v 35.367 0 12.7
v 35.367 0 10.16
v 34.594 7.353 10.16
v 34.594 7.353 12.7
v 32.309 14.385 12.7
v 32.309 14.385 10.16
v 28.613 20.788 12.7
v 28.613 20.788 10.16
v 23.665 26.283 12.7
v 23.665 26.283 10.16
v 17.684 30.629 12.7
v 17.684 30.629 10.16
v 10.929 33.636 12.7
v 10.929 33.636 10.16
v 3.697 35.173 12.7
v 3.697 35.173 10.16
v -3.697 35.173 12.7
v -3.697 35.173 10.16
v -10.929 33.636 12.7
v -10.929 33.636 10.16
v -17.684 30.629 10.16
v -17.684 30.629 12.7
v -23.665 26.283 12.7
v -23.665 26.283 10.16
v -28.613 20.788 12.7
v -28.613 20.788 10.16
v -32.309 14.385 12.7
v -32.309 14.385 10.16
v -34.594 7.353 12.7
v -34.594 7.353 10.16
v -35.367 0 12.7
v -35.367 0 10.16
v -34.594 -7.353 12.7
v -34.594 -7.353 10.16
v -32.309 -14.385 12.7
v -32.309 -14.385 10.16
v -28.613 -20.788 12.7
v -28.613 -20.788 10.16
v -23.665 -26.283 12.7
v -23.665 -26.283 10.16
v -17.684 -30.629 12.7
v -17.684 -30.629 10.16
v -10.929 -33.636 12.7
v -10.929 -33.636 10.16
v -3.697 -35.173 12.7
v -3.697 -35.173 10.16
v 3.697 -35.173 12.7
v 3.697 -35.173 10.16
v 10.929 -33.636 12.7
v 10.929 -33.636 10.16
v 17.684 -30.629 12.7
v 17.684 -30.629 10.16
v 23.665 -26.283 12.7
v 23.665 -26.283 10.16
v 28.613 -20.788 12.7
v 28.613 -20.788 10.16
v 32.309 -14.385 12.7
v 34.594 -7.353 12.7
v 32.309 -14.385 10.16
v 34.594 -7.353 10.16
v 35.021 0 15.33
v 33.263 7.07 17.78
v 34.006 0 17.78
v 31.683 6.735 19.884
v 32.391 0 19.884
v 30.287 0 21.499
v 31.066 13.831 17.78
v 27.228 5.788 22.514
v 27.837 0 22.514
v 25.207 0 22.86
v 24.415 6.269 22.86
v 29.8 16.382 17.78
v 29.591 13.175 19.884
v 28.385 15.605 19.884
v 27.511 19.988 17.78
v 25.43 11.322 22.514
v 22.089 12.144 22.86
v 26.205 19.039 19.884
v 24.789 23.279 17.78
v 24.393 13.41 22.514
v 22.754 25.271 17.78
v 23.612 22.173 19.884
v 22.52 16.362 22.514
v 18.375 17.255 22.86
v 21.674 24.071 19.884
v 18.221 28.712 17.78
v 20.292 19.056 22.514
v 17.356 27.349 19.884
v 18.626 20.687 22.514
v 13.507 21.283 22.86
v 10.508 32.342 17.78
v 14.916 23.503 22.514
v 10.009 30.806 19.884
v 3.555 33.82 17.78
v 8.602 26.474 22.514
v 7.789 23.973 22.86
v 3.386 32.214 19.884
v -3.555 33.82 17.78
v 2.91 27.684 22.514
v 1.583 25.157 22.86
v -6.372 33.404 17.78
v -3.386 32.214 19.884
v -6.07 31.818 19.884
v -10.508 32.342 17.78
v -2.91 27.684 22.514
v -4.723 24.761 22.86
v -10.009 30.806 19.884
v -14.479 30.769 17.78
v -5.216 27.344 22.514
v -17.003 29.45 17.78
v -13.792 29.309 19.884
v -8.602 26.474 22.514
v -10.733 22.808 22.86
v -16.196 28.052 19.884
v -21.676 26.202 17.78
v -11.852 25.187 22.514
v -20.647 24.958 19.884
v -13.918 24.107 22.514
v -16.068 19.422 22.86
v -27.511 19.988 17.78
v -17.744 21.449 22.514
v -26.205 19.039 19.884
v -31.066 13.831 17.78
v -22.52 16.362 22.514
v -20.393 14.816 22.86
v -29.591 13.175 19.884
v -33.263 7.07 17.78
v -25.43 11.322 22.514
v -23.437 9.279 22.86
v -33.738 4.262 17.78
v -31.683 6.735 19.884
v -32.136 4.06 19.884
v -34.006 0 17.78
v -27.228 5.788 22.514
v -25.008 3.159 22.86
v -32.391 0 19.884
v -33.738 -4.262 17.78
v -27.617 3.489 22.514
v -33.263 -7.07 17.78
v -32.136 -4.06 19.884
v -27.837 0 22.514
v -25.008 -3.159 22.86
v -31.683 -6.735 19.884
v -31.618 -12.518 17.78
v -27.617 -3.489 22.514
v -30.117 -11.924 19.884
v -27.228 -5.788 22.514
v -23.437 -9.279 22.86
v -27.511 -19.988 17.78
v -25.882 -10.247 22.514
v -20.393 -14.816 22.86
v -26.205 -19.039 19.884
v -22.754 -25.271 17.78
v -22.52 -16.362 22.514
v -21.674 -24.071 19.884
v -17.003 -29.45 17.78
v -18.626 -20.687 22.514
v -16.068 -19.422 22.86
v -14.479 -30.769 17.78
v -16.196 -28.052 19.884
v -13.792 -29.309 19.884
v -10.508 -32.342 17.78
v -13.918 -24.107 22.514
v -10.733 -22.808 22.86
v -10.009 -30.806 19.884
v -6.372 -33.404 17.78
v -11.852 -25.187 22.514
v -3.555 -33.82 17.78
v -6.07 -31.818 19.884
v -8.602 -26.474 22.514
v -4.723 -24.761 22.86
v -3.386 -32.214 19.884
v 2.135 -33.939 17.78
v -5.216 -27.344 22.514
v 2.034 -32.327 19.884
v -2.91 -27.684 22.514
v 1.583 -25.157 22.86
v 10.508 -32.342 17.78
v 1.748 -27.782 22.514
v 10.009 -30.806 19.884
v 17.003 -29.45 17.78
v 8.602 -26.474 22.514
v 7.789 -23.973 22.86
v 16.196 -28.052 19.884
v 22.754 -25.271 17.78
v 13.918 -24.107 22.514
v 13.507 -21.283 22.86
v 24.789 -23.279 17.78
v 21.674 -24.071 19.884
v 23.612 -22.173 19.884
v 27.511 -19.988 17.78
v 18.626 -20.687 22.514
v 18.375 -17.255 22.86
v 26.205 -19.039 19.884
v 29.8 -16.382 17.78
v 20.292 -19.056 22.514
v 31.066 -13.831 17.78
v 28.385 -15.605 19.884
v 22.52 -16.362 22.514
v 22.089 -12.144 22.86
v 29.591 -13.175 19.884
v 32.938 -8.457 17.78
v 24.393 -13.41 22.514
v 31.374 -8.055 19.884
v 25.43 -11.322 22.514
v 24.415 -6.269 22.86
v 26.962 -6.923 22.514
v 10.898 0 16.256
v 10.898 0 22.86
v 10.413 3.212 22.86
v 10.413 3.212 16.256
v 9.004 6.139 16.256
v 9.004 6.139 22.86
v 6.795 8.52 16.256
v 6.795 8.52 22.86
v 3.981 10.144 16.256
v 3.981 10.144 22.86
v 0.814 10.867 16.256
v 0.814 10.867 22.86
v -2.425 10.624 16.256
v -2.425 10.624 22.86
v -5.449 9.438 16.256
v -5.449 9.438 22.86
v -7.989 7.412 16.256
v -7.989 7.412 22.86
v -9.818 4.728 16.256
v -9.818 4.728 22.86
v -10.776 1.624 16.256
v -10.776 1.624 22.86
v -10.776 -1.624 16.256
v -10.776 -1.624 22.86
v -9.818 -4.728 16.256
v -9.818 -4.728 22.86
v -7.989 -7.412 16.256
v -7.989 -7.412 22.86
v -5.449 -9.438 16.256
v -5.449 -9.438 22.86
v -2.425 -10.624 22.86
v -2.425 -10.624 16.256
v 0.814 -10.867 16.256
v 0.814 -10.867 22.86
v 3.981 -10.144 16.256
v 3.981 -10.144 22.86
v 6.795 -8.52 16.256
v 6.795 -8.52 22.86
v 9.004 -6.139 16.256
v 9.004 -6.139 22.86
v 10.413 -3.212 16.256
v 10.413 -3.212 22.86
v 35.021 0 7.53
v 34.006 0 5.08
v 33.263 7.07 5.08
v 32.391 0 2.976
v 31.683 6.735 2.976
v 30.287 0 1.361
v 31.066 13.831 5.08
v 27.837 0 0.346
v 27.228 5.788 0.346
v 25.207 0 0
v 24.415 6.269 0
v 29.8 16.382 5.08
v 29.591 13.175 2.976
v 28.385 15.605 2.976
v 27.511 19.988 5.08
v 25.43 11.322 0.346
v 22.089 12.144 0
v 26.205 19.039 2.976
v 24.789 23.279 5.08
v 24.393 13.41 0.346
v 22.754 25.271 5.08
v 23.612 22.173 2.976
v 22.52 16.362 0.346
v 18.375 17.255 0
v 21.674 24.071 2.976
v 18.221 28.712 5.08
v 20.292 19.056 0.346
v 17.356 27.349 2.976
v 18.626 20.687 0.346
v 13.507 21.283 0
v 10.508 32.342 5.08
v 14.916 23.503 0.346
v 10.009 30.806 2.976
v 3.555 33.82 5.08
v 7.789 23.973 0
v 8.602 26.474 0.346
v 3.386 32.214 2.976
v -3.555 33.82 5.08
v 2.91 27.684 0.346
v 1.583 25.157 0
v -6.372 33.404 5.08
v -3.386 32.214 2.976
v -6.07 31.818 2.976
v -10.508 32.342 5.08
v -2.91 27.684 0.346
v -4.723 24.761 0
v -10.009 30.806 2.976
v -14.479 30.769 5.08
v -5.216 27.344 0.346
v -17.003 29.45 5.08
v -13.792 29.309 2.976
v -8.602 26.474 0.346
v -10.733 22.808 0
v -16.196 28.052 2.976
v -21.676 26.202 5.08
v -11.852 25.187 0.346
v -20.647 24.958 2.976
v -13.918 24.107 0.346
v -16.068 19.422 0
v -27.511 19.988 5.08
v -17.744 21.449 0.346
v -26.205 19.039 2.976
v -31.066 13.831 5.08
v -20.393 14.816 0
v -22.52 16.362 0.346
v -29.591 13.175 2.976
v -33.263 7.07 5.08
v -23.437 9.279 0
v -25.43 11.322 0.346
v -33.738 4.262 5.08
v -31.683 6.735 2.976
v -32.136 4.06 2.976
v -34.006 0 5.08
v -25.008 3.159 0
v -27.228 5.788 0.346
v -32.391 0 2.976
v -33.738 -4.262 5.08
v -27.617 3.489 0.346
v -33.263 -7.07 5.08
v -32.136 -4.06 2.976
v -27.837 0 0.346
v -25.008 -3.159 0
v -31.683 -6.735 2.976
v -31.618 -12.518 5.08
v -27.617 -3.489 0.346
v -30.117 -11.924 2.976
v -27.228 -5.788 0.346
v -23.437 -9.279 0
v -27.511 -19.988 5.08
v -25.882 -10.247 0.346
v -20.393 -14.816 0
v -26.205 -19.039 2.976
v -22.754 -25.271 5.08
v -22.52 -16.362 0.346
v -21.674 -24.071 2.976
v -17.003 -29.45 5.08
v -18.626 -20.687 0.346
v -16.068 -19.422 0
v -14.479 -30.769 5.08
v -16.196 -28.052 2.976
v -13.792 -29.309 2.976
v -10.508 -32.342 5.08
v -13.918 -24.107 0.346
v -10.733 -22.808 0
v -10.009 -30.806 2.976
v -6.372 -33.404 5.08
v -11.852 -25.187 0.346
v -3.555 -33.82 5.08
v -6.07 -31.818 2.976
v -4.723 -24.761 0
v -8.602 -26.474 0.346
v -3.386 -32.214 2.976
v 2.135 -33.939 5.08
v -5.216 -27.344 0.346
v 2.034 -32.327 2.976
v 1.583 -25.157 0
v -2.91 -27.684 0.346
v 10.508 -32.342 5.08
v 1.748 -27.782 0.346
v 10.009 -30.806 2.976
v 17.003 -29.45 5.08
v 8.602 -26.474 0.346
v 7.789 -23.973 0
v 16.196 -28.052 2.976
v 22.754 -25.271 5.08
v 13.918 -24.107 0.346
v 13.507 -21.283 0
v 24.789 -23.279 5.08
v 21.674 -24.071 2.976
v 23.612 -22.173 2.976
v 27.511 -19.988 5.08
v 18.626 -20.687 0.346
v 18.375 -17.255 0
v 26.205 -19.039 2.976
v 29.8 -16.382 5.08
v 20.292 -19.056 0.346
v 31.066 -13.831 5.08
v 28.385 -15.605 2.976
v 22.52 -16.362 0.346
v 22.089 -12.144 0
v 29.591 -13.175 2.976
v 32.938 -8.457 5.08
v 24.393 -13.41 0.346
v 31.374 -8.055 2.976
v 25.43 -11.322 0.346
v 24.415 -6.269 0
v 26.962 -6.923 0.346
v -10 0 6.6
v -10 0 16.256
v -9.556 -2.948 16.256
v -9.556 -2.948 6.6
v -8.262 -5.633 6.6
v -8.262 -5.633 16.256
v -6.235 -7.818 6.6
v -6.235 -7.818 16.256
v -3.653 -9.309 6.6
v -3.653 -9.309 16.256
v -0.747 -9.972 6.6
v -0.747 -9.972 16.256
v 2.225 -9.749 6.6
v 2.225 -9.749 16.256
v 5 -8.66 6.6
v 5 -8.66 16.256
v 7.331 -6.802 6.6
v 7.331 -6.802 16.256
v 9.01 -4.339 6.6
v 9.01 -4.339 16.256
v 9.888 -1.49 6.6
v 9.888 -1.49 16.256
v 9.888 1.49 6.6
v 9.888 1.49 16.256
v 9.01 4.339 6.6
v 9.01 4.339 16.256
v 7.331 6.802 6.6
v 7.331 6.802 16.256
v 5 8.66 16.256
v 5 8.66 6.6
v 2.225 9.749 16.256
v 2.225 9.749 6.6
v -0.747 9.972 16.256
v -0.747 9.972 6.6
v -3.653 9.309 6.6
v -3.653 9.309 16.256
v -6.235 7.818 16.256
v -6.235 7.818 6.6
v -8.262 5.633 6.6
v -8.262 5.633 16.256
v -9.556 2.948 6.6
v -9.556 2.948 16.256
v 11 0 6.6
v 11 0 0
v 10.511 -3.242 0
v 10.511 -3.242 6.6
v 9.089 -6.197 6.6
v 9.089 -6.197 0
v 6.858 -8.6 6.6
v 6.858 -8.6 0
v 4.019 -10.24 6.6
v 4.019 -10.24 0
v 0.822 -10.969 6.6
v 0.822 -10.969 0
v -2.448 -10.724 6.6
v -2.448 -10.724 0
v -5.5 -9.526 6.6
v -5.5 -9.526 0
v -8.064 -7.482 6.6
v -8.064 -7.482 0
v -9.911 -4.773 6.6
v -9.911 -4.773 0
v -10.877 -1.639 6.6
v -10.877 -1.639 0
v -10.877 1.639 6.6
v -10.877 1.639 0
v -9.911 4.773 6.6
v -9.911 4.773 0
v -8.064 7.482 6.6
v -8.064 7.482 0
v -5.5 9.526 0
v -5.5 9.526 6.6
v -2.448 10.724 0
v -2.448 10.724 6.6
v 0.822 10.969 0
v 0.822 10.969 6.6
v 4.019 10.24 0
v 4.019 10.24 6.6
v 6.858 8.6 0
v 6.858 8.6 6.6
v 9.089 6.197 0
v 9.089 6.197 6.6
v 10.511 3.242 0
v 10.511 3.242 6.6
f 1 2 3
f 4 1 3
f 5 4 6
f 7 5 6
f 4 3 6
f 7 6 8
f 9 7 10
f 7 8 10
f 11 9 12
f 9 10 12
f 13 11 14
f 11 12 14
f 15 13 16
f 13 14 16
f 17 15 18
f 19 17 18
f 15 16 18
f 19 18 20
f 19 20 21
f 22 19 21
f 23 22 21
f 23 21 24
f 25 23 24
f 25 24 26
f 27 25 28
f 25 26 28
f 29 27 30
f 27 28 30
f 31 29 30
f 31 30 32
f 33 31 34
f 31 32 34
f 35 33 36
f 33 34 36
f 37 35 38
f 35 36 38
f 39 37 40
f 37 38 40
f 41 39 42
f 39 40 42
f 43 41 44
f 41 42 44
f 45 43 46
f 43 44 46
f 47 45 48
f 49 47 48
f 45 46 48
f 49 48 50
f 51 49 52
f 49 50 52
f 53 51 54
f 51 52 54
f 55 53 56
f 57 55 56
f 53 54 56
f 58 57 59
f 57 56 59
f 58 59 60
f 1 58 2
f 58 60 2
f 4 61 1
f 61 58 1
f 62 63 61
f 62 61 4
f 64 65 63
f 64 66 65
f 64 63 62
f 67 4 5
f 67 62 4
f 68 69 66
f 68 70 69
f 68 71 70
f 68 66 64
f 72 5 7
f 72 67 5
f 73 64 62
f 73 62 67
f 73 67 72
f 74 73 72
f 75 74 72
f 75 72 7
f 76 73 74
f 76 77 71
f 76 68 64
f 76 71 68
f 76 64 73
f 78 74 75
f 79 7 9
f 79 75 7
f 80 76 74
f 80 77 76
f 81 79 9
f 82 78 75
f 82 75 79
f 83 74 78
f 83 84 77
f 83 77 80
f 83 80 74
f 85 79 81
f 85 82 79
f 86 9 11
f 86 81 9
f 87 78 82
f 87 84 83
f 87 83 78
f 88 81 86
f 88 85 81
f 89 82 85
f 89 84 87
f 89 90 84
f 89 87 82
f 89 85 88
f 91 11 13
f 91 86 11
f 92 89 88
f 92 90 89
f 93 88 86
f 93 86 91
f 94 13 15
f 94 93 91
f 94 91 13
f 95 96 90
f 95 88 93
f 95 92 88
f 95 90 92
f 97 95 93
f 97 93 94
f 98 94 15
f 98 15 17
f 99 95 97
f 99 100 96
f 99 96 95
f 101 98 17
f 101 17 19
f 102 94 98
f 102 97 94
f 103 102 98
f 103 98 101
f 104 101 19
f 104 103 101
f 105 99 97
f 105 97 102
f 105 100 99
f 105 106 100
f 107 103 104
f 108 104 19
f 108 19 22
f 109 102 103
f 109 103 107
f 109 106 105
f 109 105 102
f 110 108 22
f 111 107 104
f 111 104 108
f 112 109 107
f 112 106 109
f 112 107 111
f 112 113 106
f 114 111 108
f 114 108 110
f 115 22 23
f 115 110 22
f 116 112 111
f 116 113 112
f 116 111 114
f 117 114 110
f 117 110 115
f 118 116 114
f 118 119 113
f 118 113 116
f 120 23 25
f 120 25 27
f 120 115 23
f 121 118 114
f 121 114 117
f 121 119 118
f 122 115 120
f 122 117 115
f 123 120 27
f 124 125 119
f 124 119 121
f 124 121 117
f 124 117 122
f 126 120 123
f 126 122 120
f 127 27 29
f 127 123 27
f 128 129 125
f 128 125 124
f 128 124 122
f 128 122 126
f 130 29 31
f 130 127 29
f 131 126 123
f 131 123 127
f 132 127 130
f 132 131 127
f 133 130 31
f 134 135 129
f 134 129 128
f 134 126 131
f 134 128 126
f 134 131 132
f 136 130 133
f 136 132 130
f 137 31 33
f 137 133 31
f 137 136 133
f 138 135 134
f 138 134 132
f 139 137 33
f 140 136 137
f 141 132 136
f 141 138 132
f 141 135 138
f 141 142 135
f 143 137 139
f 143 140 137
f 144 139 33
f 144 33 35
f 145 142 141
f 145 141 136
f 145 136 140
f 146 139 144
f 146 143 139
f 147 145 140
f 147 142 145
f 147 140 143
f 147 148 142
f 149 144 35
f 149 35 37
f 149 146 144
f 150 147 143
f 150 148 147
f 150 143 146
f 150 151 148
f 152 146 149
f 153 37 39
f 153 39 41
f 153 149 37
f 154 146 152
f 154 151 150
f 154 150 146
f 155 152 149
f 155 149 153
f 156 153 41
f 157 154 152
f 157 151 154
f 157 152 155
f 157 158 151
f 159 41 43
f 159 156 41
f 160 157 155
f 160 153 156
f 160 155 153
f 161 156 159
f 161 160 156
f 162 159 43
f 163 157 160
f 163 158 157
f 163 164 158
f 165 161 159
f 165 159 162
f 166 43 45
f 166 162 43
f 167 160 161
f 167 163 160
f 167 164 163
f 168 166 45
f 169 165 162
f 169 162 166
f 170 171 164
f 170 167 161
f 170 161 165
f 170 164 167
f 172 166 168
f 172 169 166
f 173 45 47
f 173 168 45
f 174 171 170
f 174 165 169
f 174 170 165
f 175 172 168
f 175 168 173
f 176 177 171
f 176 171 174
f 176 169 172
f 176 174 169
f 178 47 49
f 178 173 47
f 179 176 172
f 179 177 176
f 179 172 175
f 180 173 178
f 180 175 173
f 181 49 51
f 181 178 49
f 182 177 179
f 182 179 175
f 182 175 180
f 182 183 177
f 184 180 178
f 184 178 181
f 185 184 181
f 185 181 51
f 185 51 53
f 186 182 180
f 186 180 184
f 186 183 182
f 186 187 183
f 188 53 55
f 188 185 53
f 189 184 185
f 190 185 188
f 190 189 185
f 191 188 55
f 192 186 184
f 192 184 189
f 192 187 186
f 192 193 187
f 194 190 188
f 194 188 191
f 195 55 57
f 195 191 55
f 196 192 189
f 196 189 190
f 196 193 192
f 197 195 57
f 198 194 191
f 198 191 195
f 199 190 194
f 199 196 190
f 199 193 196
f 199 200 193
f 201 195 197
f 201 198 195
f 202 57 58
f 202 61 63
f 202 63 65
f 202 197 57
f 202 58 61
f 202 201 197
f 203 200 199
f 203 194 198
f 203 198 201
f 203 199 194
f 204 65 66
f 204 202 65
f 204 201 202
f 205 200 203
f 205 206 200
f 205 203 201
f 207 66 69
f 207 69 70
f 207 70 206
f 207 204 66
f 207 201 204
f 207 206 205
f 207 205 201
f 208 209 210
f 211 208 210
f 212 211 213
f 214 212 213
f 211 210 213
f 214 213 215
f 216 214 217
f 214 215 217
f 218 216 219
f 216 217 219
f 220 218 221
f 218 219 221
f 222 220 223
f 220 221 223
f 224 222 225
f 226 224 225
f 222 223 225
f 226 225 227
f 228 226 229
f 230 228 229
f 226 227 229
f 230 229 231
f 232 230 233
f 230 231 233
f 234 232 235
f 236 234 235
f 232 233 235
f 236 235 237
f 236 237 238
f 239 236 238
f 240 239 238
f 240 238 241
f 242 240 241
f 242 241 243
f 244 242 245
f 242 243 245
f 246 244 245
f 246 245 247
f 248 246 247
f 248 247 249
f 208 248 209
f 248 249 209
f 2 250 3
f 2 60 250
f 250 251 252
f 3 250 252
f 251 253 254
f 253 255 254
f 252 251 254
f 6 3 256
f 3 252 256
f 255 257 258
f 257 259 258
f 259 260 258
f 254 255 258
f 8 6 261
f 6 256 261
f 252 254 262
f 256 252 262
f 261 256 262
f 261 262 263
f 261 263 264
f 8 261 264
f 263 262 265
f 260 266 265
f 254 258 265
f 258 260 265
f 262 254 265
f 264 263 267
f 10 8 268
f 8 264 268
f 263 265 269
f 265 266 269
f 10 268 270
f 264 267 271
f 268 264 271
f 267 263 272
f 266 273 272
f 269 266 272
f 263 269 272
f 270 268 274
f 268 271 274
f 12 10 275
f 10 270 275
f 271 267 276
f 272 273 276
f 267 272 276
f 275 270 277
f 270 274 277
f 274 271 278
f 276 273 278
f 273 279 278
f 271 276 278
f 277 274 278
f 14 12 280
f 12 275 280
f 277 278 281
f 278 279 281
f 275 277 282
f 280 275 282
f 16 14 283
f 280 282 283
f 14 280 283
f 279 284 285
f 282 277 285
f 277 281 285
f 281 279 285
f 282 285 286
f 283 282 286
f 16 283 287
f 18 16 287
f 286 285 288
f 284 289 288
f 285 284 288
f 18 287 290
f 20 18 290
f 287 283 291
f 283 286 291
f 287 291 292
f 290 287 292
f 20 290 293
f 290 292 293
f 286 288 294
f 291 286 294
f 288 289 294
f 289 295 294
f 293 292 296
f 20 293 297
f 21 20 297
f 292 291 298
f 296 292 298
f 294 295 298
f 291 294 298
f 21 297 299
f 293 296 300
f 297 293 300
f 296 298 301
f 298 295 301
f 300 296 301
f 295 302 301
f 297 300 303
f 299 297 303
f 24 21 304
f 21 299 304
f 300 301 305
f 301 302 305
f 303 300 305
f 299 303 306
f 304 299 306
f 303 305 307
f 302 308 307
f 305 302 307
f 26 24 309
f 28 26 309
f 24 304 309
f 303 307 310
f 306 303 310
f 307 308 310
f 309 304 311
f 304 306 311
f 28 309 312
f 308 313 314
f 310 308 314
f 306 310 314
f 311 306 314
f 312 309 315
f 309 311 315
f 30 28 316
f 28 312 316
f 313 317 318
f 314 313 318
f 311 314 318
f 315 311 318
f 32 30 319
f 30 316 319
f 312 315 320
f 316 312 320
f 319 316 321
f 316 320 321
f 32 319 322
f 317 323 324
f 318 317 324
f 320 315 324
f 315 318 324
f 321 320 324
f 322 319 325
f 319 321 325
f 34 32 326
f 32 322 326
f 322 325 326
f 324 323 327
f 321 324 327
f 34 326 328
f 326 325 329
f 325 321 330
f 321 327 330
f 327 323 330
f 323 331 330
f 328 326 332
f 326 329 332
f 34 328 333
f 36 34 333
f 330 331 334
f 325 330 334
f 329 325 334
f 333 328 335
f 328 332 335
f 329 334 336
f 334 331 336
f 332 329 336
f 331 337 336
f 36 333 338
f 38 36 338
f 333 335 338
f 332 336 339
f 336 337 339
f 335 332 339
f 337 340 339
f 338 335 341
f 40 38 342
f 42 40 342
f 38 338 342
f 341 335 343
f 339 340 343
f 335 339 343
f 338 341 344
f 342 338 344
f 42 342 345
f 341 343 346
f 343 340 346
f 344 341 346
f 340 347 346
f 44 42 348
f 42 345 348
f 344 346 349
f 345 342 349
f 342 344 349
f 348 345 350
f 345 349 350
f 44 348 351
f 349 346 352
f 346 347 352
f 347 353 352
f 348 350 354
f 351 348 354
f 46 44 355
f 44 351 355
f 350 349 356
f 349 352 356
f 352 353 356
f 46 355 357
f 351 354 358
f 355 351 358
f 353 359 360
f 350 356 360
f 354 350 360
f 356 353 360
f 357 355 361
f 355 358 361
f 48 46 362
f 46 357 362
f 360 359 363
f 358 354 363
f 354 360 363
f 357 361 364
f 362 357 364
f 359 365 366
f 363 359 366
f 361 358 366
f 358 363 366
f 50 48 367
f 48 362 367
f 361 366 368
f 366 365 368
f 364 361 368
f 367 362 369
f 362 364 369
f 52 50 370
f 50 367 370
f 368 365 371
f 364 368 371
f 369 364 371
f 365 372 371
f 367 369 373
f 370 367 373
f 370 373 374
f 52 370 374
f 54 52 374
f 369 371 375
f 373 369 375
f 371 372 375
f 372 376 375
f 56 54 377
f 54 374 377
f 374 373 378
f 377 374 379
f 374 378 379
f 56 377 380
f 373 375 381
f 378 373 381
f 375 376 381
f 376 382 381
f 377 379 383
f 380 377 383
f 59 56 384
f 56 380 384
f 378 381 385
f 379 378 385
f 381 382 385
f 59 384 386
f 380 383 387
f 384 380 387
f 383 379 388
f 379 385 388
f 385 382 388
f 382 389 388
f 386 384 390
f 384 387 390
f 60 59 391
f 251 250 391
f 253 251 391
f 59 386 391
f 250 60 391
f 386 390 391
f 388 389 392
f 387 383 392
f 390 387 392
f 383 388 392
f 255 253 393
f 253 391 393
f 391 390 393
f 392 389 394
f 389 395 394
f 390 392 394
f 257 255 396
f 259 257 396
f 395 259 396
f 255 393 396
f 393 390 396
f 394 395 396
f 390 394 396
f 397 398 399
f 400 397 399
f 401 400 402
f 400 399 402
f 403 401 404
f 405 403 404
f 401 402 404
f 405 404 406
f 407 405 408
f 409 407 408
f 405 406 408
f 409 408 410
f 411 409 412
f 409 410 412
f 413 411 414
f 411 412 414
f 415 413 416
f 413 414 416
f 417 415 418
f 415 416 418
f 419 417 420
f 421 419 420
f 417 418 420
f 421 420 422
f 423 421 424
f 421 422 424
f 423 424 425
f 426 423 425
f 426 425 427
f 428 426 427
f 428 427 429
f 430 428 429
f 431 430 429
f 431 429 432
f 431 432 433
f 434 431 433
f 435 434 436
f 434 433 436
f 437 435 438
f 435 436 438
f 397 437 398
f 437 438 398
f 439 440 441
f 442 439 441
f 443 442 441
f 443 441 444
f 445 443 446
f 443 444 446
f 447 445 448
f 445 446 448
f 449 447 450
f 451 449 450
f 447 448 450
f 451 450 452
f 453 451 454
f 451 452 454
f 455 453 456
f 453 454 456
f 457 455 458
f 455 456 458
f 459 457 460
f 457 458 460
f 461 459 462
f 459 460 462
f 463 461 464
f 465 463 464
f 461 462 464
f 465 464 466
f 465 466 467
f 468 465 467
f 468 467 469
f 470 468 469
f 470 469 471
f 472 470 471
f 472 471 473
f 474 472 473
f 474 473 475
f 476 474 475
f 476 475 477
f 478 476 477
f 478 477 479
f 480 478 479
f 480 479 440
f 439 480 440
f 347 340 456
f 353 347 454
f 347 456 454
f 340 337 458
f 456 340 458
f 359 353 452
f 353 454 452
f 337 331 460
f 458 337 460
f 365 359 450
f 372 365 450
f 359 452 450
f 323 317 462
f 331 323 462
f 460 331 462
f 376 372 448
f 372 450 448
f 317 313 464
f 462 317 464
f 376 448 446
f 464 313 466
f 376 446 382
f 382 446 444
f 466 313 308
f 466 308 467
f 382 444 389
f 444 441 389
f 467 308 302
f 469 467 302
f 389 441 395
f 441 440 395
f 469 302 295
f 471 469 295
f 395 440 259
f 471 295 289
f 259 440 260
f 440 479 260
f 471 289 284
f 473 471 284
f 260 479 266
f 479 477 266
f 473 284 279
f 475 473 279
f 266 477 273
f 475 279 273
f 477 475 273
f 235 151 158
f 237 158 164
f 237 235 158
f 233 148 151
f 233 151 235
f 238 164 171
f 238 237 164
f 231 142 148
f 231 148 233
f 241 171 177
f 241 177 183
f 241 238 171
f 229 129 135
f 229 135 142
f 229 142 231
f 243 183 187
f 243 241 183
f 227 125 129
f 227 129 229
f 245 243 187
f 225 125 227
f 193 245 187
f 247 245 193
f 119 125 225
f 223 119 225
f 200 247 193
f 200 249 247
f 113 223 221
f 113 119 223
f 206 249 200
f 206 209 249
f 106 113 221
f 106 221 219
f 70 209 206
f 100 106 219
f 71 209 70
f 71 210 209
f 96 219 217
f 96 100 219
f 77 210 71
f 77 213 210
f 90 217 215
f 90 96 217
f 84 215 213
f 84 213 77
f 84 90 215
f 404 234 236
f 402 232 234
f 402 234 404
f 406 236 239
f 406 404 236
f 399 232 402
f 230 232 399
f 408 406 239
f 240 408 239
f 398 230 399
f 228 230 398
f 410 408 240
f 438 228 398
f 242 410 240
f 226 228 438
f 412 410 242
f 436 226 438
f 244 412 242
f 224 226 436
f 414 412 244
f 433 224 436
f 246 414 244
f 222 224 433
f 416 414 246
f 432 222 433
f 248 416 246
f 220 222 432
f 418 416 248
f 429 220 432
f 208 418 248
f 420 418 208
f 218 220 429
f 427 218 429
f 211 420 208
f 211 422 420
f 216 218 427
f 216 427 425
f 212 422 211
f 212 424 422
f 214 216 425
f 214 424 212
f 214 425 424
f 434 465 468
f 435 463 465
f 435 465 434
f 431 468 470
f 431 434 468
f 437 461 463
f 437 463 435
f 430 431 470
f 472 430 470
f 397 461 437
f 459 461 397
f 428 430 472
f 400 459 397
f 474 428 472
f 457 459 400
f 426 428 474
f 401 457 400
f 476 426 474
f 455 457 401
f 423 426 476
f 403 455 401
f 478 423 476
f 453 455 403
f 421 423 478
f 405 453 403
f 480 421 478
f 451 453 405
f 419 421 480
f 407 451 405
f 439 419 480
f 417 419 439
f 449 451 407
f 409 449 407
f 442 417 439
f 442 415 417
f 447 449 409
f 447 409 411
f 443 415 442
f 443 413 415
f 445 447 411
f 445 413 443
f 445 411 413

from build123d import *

# Parameters (mm, degrees)
F0_R           = 35.367098
F1_DEPTH       = 22.86
F2_D           = 20
F2_CBORE_D     = 22
F2_CBORE_DEPTH = 6.6
F3_R           = 10.89761
F4_DEPTH       = 6.604
F5_R           = 10.16


with BuildPart() as f1:
    # F0 (on Top) → F1 (new body)
    with BuildSketch(Plane.XY):
        Circle(F0_R)
    extrude(amount=F1_DEPTH)

    # F2 (through all)
    with Locations(Plane(origin=(0, 0, 0), x_dir=(1, 0, 0), z_dir=(0, 0, -1))):
        with Locations((0, 0)):
            CounterBoreHole(F2_D / 2, F2_CBORE_D / 2, F2_CBORE_DEPTH)

    # F3 (on face) → F4 (cut)
    with BuildSketch(Plane.XY.offset(22.86)):
        Circle(F3_R)
    extrude(amount=-F4_DEPTH, mode=Mode.SUBTRACT)

    # F5
    f5_edges = [f1.edges().sort_by_distance(p)[0] for p in [
        (35.367098, 0, 11.43),
        (-35.367098, 0, 0),
        (-35.367098, 0, 22.86),
    ]]
    fillet(f5_edges, radius=F5_R)


solid = f1.part
